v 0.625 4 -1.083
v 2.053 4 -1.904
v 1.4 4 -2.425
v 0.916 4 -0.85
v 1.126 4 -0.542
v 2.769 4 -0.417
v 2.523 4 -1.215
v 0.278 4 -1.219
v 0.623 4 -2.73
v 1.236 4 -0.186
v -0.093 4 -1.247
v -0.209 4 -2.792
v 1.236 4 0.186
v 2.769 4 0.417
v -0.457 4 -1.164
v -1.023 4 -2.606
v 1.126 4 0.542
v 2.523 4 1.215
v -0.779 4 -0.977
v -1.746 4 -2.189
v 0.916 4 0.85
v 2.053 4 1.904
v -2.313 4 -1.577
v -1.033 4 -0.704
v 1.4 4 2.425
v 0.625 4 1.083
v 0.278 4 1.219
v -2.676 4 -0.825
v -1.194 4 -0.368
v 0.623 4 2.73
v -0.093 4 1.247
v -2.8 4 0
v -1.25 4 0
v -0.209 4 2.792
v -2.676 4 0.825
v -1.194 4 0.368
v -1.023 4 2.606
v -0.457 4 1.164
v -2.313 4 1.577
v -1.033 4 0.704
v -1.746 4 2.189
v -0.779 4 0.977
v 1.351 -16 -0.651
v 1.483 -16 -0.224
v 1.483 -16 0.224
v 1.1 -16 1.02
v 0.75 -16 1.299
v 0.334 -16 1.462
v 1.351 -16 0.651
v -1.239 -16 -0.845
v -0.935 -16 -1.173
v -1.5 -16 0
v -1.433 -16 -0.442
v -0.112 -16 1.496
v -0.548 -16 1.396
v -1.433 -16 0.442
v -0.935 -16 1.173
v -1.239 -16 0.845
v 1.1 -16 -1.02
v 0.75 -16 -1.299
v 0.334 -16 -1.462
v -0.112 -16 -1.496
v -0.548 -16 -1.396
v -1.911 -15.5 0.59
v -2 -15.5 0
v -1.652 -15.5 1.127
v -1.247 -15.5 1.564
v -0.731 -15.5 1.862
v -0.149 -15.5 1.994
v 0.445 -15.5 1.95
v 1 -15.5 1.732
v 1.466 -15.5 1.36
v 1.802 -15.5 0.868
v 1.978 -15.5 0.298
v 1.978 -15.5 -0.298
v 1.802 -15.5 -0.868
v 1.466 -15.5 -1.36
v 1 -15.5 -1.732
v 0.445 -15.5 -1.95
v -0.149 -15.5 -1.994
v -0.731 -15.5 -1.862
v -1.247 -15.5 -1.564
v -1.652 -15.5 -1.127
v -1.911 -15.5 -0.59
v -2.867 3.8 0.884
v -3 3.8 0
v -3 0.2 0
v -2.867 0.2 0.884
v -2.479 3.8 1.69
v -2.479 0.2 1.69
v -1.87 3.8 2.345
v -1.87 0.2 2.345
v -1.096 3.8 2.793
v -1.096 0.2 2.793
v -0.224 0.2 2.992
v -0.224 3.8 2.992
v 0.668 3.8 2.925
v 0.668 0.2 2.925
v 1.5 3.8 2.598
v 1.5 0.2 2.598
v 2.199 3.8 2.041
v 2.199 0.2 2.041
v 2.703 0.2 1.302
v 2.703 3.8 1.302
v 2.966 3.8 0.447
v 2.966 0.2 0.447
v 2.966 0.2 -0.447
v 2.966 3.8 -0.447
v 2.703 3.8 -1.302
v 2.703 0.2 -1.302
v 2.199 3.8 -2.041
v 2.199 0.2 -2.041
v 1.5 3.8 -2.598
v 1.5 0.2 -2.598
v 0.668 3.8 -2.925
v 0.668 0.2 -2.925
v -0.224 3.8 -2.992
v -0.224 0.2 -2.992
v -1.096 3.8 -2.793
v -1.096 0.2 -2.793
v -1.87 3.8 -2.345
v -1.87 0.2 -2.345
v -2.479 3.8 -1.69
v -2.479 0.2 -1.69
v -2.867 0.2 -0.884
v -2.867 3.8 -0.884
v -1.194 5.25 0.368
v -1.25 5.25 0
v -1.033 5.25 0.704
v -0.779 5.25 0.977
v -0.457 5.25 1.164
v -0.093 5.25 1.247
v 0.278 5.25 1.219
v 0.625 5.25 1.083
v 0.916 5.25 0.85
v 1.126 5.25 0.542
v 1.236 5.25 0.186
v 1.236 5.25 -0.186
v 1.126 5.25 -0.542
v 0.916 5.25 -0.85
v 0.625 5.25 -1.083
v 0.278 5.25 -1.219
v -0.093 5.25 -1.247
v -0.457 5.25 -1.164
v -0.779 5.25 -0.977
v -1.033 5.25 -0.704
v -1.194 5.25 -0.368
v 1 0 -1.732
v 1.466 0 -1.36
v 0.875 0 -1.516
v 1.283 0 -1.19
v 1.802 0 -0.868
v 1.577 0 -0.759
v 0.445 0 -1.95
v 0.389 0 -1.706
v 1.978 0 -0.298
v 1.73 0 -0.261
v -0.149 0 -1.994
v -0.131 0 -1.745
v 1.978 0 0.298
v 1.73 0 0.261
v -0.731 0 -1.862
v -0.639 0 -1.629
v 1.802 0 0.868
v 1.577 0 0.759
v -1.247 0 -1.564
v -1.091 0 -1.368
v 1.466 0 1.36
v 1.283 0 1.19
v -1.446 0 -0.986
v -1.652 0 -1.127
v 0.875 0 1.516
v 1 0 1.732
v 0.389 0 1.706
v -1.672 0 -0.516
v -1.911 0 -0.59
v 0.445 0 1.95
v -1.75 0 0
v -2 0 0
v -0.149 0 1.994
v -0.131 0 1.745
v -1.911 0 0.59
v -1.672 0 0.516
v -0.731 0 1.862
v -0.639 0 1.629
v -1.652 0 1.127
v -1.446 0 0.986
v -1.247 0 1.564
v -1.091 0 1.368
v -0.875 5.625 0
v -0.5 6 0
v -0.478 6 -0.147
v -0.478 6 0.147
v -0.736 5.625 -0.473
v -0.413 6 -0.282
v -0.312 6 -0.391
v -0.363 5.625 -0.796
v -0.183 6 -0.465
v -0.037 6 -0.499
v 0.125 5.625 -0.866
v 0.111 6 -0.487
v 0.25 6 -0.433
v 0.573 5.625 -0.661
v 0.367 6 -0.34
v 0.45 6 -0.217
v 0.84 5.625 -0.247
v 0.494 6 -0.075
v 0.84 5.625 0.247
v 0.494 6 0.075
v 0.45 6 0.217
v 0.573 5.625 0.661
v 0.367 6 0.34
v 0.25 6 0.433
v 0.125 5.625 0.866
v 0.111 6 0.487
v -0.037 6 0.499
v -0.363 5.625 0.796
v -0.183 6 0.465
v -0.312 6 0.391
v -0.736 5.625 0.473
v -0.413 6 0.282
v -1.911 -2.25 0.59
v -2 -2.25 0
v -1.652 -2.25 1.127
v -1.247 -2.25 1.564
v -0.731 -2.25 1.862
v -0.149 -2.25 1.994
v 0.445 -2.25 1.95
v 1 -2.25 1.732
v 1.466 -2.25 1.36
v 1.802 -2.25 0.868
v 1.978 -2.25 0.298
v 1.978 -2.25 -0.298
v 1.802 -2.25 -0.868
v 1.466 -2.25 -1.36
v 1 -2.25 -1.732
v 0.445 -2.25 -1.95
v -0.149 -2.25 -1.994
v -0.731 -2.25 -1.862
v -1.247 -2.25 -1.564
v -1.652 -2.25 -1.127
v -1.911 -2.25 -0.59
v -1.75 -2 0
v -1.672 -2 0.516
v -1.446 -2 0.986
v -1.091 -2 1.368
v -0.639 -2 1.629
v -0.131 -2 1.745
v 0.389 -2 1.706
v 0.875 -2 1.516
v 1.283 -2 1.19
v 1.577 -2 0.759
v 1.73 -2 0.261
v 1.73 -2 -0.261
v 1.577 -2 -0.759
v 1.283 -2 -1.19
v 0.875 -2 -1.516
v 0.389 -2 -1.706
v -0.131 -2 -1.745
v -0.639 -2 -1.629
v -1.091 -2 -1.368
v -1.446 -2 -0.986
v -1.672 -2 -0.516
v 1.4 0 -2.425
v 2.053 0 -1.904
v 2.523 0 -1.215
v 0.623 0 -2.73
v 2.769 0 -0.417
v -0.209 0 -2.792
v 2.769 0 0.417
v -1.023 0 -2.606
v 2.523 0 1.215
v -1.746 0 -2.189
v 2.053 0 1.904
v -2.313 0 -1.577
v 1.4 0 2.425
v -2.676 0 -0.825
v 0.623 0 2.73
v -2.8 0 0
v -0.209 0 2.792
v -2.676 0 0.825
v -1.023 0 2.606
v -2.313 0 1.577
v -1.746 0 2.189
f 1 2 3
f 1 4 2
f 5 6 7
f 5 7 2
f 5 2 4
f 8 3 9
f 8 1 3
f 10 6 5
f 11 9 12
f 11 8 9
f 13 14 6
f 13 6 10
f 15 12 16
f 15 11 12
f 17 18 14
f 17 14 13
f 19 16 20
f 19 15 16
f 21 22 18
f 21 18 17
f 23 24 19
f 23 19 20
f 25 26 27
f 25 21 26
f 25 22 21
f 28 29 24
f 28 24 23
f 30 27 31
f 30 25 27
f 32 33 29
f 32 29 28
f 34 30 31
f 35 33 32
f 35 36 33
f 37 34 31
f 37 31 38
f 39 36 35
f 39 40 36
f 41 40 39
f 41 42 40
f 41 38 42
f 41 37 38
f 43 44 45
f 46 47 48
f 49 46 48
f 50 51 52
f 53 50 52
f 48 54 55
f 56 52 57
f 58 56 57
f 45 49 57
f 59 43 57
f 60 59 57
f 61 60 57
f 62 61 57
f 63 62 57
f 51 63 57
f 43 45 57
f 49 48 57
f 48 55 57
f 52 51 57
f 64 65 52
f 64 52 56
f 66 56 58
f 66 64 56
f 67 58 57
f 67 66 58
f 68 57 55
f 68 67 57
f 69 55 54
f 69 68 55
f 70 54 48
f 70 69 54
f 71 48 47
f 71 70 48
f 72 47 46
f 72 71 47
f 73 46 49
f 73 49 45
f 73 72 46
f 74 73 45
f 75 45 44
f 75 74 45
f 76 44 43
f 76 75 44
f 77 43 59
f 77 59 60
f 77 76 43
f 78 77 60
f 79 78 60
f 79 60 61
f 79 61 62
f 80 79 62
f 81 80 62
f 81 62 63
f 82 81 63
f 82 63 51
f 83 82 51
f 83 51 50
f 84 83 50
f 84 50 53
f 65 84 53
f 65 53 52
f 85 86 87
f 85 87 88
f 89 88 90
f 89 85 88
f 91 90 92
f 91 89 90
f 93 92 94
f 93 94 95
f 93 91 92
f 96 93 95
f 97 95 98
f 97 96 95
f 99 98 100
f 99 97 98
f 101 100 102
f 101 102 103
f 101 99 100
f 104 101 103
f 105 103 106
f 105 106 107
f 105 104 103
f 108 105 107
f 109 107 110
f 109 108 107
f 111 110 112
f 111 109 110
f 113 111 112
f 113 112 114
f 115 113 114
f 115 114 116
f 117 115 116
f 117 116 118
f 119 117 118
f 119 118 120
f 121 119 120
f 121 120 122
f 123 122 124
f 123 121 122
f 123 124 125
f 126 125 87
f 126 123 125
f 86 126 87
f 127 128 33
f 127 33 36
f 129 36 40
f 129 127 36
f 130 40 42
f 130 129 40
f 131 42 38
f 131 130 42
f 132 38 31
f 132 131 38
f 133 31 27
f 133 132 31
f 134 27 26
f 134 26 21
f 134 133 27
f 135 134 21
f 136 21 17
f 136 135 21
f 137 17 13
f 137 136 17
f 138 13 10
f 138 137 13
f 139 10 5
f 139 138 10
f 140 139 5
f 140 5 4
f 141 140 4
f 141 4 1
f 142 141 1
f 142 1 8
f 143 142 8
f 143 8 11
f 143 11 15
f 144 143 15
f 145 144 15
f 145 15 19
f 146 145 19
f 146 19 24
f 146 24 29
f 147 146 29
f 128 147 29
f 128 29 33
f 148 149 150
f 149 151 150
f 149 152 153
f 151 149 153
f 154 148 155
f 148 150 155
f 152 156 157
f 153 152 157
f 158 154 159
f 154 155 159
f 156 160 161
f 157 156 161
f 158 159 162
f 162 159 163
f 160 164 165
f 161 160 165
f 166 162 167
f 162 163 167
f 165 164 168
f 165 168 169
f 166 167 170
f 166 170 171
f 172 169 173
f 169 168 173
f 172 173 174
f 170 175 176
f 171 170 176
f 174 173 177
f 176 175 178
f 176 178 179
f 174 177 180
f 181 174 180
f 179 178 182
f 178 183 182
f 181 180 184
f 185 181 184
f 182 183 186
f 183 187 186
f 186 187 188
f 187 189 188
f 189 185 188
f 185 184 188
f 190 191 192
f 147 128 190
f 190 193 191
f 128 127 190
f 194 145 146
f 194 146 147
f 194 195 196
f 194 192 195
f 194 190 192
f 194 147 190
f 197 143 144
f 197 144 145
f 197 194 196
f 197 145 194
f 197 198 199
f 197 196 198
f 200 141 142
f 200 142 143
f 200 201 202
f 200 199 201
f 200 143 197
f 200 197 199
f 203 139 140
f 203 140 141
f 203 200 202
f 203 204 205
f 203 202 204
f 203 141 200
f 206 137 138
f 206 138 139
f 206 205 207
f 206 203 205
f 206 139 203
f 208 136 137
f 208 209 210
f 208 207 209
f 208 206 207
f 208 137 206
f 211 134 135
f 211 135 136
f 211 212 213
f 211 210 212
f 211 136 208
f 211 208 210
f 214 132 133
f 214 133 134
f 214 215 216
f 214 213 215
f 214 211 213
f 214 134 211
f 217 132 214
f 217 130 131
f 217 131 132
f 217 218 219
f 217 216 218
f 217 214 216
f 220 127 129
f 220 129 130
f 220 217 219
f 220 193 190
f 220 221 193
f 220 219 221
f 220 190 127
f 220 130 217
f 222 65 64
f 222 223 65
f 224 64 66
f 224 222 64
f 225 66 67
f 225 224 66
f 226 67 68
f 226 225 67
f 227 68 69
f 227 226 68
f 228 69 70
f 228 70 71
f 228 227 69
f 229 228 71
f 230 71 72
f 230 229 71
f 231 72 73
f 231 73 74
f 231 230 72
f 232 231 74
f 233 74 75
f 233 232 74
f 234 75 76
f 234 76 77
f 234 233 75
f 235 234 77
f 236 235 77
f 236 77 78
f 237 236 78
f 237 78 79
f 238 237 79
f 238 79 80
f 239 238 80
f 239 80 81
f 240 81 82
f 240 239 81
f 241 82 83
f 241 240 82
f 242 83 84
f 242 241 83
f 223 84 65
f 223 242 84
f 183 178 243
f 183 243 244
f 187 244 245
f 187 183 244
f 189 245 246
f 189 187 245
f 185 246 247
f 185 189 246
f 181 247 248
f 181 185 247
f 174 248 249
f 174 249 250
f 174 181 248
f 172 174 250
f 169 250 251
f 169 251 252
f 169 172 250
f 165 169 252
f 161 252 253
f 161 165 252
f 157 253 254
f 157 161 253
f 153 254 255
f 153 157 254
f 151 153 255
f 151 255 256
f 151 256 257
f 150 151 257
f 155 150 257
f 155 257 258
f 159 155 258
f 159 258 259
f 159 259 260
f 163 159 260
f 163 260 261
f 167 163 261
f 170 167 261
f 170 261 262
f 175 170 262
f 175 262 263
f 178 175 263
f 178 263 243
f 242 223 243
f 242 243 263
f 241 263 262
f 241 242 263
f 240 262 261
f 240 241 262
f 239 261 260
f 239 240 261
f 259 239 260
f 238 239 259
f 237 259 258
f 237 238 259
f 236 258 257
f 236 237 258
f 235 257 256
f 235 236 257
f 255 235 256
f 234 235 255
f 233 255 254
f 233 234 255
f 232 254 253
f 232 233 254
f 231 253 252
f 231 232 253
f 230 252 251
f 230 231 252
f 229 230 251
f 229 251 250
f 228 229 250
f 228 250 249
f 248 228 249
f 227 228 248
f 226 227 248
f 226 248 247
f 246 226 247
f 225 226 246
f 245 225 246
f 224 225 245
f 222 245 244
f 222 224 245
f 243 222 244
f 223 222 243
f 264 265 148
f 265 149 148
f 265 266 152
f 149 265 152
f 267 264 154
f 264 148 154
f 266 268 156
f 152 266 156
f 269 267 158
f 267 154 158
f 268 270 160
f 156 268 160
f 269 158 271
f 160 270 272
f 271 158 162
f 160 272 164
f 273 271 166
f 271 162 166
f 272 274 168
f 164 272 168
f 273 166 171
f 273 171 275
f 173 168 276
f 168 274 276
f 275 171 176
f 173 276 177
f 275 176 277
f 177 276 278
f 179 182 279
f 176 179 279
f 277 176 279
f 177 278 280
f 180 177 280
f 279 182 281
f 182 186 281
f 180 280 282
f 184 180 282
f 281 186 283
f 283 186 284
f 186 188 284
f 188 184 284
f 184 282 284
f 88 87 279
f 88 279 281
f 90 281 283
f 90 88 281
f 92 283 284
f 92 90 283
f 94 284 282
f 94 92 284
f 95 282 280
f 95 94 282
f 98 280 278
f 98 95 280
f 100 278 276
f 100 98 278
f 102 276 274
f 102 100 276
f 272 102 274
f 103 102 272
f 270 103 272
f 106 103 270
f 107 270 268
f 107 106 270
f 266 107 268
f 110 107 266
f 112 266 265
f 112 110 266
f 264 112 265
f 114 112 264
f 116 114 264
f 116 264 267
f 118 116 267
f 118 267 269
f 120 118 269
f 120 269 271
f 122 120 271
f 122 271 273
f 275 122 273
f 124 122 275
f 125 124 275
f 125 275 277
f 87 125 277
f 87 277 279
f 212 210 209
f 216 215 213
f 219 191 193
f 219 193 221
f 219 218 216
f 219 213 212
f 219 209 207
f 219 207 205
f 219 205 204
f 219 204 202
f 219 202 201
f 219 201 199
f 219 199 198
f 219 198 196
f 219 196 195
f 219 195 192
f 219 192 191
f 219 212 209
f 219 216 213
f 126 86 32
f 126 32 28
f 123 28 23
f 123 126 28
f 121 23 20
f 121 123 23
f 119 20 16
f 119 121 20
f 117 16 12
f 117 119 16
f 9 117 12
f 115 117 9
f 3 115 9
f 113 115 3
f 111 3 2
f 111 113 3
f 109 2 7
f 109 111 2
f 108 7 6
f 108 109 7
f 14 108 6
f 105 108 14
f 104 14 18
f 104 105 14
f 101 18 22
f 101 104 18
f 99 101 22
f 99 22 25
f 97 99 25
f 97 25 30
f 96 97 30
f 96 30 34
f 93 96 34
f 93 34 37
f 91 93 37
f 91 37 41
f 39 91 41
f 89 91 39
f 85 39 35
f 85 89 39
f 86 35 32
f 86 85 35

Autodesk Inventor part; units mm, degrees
ref_plane "YZ Plane" through (0, 0, 0) normal (1, 0, 0) x (0, 1, 0)
ref_plane "XZ Plane" through (0, 0, 0) normal (0, 1, 0) x (-1, 0, 0)
ref_plane "XY Plane" through (0, 0, 0) normal (0, 0, 1) x (1, 0, 0)
sketch "Esboço1" plane through (0, 0, 0) normal (0, 0, 1) x (1, 0, 0)
  line L0 (0, -20.4) -> (0, 10.4) construction
  line L1 (-3.6, 0) -> (0.6, 0) construction
  line L2 (0, -16) -> (-2, -16)
  line L3 (-2, -16) -> (-2, 0)
  line L4 (-2, 0) -> (-3, 0)
  line L5 (-3, 0) -> (-3, 4)
  line L6 (-3, 4) -> (-1.25, 4)
  line L7 (-1.25, 4) -> (-1.25, 6)
  line L8 (-1.25, 6) -> (0, 6)
  line L9 (0, 6) -> (0, -16)
  line L10 (-0.5, 6) -> (-1.25, 5.25)
  line L11 (-2, -15.5) -> (-1.5, -16)
  line L12 (-3, 3.8) -> (-2.8, 4)
  line L13 (-3, 2) -> (0, 2) construction
  line L14 (-3, 0.2) -> (-2.8, 0)
  line L15 (-2, -2) -> (-1.75, -2)
  line L16 (-1.75, -2) -> (-1.75, 0)
  line L17 (-1.75, 0) -> (-2, 0)
  line L18 (-2, 0) -> (-2, -2)
  line L19 (-1.75, -2) -> (-2, -2.25)
  point P0 (0, 0)
  dimension "d0" = 2
  dimension "d1" = 6
  dimension "d2" = 2.5
  dimension "d3" = 0.75
  dimension "d4" = 0.75
  dimension "d5" = 4
  dimension "d6" = 16
  dimension "d7" = 22
  dimension "d8" = 4
  dimension "d9" = 0.5
  dimension "d10" = 0.5
  dimension "d12" = 0.2
  dimension "d13" = 0.2
  dimension "d16" = 3.5
  dimension "d17" = 2
  dimension "d18" = 0.25
  dimension "d19" = 0.25
revolve "Revolução1" add sketch "Esboço1" angle 360 about axis through (0, -10, 0) along (0, 1, 0) contours L2 L11 L3 L19 L16 L17 L4 L14 L5 L12 L6 L7 L10 L8 L9
thread "Rosca1" size "M4x0.7" class "6g" standard "ISO Metric profile" full length
equation "\"d4\" = d3"
equation "\"d10\" = d9"
equation "\"d18\" = d19"
properties part number "GRJ-03-119" material "Aço SAE 1045"
